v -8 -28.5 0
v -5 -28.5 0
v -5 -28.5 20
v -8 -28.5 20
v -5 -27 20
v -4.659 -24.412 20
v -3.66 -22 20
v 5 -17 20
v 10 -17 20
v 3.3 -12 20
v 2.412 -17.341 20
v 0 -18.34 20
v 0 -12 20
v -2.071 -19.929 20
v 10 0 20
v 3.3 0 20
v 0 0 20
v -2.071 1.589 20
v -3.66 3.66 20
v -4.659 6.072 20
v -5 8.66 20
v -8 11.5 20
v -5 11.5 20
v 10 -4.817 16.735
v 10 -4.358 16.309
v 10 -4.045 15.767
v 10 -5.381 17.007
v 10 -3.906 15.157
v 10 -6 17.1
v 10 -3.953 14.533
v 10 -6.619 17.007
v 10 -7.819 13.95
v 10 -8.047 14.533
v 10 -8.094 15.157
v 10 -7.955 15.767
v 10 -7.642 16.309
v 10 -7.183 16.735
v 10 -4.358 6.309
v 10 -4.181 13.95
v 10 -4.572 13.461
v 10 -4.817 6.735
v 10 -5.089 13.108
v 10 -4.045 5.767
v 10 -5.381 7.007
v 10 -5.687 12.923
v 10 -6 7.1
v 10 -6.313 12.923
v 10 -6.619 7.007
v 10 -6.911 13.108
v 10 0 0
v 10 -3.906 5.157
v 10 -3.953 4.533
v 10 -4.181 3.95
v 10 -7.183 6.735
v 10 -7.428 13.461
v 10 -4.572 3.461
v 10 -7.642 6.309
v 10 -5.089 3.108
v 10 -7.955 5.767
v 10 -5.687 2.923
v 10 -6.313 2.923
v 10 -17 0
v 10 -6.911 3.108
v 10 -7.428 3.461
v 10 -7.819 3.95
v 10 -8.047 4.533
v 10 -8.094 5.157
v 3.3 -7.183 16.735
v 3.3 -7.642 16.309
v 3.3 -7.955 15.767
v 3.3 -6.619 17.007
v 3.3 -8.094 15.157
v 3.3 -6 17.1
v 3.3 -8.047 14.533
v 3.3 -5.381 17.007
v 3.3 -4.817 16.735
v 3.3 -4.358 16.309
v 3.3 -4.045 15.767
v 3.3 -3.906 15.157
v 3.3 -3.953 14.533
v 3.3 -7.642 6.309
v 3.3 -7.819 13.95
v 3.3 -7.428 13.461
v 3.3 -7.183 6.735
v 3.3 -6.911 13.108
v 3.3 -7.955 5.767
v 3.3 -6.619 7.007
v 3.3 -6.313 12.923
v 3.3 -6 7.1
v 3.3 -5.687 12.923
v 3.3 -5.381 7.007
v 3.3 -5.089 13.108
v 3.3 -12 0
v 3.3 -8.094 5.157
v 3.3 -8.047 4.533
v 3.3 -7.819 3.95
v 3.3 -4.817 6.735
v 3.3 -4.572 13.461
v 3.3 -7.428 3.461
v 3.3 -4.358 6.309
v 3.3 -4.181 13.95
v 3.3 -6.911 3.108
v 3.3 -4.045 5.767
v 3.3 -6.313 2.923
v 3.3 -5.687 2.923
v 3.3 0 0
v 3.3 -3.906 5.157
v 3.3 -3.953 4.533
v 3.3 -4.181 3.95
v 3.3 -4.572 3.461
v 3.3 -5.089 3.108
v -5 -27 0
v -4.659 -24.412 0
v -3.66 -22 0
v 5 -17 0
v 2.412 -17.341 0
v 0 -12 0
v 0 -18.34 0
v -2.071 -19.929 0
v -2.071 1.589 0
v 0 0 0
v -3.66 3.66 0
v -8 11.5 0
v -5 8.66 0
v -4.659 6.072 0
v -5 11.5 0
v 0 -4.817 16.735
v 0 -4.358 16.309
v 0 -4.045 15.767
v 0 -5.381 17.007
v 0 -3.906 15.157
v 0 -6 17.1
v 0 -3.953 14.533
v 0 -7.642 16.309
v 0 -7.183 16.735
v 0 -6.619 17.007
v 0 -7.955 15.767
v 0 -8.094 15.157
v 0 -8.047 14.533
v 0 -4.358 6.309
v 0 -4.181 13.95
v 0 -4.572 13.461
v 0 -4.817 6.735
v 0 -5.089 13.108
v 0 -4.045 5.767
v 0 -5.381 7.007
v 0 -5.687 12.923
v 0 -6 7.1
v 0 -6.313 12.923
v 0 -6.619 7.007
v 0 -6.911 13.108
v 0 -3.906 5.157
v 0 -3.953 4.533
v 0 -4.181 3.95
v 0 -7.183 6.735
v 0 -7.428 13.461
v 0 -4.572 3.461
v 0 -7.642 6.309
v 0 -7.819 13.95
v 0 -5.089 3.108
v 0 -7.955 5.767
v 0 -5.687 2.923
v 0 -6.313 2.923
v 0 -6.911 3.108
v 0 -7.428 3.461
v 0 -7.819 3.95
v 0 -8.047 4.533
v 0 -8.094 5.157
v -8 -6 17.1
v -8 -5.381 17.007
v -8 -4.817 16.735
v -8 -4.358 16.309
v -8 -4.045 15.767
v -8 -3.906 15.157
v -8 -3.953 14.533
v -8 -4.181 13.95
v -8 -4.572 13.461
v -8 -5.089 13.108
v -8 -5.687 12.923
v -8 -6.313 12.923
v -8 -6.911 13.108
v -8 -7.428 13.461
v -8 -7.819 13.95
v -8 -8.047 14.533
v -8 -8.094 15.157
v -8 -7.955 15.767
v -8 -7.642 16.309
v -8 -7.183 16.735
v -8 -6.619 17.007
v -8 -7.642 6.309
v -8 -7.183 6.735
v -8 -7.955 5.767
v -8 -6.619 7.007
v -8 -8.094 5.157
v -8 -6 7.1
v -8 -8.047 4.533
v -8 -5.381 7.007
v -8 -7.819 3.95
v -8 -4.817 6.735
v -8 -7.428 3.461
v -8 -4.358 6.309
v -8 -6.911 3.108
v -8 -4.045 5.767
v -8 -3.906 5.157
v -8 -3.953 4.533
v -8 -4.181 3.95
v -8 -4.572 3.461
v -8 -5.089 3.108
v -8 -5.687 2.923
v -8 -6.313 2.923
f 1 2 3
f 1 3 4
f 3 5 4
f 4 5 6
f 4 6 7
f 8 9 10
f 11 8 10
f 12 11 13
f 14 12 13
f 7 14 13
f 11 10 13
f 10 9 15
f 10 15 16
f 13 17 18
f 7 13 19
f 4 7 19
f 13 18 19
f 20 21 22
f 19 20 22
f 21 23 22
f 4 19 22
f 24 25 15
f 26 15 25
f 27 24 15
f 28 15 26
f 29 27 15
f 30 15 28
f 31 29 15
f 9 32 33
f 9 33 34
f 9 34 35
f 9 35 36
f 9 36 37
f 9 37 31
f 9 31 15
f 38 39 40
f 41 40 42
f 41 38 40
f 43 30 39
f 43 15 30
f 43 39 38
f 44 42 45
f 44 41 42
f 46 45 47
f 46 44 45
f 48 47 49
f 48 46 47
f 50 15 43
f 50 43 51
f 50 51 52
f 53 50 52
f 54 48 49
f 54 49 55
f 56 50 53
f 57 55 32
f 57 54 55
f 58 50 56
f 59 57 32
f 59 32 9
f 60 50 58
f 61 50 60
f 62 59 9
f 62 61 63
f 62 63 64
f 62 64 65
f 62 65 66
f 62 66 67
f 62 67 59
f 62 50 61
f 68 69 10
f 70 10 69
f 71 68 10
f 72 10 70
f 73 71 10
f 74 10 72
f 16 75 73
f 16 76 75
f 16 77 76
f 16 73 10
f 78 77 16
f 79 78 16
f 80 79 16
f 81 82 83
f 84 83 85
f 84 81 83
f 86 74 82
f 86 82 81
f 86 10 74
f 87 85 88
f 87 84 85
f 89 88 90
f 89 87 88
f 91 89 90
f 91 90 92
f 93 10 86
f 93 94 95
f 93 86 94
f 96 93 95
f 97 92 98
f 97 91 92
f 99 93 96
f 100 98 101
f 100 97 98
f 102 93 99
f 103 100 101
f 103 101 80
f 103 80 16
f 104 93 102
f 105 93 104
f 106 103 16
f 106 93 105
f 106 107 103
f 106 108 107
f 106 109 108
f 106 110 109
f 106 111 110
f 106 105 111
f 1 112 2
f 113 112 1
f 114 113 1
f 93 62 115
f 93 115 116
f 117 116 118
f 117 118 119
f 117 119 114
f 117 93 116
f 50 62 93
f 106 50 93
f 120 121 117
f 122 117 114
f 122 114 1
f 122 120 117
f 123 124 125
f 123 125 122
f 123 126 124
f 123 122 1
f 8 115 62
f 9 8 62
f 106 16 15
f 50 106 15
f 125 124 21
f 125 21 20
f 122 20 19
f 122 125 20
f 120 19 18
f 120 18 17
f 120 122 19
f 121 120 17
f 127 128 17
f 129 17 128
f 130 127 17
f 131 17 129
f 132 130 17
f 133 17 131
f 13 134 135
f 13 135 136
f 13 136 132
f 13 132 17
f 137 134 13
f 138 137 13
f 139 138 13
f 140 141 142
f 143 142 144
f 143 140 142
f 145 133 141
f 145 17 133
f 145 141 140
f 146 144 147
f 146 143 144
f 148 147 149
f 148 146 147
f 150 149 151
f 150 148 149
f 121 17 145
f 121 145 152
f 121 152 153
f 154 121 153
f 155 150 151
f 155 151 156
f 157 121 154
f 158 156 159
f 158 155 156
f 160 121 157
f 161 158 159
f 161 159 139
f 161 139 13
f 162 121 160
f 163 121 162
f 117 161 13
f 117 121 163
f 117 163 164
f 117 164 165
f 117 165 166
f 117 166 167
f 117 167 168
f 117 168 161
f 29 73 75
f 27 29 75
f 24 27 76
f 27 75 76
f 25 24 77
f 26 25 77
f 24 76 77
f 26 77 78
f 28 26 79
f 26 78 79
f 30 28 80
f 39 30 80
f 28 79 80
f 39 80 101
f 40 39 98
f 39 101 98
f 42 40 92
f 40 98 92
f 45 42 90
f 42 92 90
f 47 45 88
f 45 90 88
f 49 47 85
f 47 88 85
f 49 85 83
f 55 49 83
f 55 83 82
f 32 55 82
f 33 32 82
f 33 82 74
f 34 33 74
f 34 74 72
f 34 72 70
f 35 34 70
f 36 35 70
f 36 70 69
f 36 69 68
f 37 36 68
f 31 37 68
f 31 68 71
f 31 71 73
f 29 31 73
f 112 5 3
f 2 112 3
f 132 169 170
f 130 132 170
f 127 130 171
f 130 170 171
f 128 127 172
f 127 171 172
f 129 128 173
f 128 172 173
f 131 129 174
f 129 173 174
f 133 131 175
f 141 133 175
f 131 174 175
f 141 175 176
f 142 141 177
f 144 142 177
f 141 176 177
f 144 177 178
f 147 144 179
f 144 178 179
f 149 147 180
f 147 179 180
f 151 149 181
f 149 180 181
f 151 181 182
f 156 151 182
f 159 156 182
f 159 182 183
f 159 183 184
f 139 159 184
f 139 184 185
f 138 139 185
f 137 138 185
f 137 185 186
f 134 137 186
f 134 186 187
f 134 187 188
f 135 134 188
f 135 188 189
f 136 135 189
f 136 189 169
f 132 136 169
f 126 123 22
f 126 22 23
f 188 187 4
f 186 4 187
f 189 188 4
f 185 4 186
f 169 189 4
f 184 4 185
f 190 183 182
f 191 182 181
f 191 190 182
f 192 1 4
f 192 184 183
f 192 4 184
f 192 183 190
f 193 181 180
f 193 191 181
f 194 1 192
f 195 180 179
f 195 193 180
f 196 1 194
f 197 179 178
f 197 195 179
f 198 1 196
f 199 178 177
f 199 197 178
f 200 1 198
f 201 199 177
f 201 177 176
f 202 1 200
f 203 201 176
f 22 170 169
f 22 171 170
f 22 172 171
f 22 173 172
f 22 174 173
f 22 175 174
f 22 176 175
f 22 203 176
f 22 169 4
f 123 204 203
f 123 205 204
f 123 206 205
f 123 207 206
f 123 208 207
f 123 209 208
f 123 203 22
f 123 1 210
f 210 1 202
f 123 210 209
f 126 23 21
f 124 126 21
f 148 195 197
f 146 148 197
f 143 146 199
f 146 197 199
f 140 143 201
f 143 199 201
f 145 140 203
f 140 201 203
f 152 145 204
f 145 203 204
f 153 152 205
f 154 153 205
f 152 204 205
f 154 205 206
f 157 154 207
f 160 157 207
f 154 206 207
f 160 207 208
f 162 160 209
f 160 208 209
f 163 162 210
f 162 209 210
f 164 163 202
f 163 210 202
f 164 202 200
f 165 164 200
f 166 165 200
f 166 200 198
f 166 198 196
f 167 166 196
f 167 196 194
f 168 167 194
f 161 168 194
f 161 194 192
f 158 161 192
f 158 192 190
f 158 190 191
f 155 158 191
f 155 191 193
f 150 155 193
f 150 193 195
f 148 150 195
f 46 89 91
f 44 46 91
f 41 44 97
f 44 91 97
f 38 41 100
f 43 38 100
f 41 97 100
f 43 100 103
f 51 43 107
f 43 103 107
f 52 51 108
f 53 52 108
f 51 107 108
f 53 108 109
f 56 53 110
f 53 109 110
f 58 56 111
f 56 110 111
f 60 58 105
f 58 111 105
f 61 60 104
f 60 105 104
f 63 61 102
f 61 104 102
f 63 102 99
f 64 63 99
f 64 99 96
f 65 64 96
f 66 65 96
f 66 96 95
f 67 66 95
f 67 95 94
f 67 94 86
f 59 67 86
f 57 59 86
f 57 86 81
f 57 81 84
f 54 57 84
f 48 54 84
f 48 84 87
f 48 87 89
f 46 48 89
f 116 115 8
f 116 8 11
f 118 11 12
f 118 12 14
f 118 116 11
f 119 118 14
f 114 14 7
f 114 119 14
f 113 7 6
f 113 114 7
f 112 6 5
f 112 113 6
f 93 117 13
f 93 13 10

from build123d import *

# Parameters (mm, degrees)
EXTRUDE_1_DEPTH     = 20
FILLET_1_R          = 10
SKETCH_2_R          = 2.1
CUT_EXTRUDE_1_DEPTH = 40.195025195


with BuildPart() as part:
    # 草图1 → 凸台-拉伸1 (new body)
    with BuildSketch(Plane.XY):
        Polygon((3.3, 0), (10, 0), (10, -17), (0, -17), (-5, -17), (-5, -28.5), (-8, -28.5), (-8, 11.5), (-5, 11.5), (-5, 0), (0, 0), (0, -12), (3.3, -12), align=None)
    extrude(amount=EXTRUDE_1_DEPTH)

    # 圆角1
    # the kernel refuses this fillet: 10 mm, written as the material it adds along each edge
    with BuildSketch(Plane(origin=(-5, -17, 0), x_dir=(0, -1, 0), z_dir=(0, 0, 1))) as fillet_1_piece_1:
        with BuildLine():
            CenterArc((FILLET_1_R, FILLET_1_R), FILLET_1_R, 180, 90)
            Line((0, FILLET_1_R), (-FILLET_1_R * 0.02, FILLET_1_R))
            Line((-FILLET_1_R * 0.02, FILLET_1_R), (-FILLET_1_R * 0.02, -FILLET_1_R * 0.02))
            Line((-FILLET_1_R * 0.02, -FILLET_1_R * 0.02), (FILLET_1_R, -FILLET_1_R * 0.02))
            Line((FILLET_1_R, -FILLET_1_R * 0.02), (FILLET_1_R, 0))
        make_face()
    extrude(amount=20)
    with BuildSketch(Plane(origin=(-5, 0, 0), x_dir=(1, 0, 0), z_dir=(0, 0, 1))) as fillet_1_piece_2:
        with BuildLine():
            CenterArc((10, 8.660254038), FILLET_1_R, 180, 60)
            Line((0, 8.660254038), (-0.2, 8.660254038))
            Line((-0.2, 8.660254038), (-0.2, 0))
            Line((-0.2, 0), (0, -0.2))
            ThreePointArc((0, -0.2), (2.5, -0.2), (4.9, -0.173205081))
            Line((4.9, -0.173205081), (5, 0))
        make_face()
    extrude(amount=20)

    # 草图2 → 切除-拉伸1 (cut, through all)
    with BuildSketch(Plane.ZY.offset(8)):
        with Locations((5, -6)):
            Circle(SKETCH_2_R)
        with Locations((15, -6)):
            Circle(SKETCH_2_R)
    extrude(amount=-CUT_EXTRUDE_1_DEPTH, mode=Mode.SUBTRACT)


solid = part.part
